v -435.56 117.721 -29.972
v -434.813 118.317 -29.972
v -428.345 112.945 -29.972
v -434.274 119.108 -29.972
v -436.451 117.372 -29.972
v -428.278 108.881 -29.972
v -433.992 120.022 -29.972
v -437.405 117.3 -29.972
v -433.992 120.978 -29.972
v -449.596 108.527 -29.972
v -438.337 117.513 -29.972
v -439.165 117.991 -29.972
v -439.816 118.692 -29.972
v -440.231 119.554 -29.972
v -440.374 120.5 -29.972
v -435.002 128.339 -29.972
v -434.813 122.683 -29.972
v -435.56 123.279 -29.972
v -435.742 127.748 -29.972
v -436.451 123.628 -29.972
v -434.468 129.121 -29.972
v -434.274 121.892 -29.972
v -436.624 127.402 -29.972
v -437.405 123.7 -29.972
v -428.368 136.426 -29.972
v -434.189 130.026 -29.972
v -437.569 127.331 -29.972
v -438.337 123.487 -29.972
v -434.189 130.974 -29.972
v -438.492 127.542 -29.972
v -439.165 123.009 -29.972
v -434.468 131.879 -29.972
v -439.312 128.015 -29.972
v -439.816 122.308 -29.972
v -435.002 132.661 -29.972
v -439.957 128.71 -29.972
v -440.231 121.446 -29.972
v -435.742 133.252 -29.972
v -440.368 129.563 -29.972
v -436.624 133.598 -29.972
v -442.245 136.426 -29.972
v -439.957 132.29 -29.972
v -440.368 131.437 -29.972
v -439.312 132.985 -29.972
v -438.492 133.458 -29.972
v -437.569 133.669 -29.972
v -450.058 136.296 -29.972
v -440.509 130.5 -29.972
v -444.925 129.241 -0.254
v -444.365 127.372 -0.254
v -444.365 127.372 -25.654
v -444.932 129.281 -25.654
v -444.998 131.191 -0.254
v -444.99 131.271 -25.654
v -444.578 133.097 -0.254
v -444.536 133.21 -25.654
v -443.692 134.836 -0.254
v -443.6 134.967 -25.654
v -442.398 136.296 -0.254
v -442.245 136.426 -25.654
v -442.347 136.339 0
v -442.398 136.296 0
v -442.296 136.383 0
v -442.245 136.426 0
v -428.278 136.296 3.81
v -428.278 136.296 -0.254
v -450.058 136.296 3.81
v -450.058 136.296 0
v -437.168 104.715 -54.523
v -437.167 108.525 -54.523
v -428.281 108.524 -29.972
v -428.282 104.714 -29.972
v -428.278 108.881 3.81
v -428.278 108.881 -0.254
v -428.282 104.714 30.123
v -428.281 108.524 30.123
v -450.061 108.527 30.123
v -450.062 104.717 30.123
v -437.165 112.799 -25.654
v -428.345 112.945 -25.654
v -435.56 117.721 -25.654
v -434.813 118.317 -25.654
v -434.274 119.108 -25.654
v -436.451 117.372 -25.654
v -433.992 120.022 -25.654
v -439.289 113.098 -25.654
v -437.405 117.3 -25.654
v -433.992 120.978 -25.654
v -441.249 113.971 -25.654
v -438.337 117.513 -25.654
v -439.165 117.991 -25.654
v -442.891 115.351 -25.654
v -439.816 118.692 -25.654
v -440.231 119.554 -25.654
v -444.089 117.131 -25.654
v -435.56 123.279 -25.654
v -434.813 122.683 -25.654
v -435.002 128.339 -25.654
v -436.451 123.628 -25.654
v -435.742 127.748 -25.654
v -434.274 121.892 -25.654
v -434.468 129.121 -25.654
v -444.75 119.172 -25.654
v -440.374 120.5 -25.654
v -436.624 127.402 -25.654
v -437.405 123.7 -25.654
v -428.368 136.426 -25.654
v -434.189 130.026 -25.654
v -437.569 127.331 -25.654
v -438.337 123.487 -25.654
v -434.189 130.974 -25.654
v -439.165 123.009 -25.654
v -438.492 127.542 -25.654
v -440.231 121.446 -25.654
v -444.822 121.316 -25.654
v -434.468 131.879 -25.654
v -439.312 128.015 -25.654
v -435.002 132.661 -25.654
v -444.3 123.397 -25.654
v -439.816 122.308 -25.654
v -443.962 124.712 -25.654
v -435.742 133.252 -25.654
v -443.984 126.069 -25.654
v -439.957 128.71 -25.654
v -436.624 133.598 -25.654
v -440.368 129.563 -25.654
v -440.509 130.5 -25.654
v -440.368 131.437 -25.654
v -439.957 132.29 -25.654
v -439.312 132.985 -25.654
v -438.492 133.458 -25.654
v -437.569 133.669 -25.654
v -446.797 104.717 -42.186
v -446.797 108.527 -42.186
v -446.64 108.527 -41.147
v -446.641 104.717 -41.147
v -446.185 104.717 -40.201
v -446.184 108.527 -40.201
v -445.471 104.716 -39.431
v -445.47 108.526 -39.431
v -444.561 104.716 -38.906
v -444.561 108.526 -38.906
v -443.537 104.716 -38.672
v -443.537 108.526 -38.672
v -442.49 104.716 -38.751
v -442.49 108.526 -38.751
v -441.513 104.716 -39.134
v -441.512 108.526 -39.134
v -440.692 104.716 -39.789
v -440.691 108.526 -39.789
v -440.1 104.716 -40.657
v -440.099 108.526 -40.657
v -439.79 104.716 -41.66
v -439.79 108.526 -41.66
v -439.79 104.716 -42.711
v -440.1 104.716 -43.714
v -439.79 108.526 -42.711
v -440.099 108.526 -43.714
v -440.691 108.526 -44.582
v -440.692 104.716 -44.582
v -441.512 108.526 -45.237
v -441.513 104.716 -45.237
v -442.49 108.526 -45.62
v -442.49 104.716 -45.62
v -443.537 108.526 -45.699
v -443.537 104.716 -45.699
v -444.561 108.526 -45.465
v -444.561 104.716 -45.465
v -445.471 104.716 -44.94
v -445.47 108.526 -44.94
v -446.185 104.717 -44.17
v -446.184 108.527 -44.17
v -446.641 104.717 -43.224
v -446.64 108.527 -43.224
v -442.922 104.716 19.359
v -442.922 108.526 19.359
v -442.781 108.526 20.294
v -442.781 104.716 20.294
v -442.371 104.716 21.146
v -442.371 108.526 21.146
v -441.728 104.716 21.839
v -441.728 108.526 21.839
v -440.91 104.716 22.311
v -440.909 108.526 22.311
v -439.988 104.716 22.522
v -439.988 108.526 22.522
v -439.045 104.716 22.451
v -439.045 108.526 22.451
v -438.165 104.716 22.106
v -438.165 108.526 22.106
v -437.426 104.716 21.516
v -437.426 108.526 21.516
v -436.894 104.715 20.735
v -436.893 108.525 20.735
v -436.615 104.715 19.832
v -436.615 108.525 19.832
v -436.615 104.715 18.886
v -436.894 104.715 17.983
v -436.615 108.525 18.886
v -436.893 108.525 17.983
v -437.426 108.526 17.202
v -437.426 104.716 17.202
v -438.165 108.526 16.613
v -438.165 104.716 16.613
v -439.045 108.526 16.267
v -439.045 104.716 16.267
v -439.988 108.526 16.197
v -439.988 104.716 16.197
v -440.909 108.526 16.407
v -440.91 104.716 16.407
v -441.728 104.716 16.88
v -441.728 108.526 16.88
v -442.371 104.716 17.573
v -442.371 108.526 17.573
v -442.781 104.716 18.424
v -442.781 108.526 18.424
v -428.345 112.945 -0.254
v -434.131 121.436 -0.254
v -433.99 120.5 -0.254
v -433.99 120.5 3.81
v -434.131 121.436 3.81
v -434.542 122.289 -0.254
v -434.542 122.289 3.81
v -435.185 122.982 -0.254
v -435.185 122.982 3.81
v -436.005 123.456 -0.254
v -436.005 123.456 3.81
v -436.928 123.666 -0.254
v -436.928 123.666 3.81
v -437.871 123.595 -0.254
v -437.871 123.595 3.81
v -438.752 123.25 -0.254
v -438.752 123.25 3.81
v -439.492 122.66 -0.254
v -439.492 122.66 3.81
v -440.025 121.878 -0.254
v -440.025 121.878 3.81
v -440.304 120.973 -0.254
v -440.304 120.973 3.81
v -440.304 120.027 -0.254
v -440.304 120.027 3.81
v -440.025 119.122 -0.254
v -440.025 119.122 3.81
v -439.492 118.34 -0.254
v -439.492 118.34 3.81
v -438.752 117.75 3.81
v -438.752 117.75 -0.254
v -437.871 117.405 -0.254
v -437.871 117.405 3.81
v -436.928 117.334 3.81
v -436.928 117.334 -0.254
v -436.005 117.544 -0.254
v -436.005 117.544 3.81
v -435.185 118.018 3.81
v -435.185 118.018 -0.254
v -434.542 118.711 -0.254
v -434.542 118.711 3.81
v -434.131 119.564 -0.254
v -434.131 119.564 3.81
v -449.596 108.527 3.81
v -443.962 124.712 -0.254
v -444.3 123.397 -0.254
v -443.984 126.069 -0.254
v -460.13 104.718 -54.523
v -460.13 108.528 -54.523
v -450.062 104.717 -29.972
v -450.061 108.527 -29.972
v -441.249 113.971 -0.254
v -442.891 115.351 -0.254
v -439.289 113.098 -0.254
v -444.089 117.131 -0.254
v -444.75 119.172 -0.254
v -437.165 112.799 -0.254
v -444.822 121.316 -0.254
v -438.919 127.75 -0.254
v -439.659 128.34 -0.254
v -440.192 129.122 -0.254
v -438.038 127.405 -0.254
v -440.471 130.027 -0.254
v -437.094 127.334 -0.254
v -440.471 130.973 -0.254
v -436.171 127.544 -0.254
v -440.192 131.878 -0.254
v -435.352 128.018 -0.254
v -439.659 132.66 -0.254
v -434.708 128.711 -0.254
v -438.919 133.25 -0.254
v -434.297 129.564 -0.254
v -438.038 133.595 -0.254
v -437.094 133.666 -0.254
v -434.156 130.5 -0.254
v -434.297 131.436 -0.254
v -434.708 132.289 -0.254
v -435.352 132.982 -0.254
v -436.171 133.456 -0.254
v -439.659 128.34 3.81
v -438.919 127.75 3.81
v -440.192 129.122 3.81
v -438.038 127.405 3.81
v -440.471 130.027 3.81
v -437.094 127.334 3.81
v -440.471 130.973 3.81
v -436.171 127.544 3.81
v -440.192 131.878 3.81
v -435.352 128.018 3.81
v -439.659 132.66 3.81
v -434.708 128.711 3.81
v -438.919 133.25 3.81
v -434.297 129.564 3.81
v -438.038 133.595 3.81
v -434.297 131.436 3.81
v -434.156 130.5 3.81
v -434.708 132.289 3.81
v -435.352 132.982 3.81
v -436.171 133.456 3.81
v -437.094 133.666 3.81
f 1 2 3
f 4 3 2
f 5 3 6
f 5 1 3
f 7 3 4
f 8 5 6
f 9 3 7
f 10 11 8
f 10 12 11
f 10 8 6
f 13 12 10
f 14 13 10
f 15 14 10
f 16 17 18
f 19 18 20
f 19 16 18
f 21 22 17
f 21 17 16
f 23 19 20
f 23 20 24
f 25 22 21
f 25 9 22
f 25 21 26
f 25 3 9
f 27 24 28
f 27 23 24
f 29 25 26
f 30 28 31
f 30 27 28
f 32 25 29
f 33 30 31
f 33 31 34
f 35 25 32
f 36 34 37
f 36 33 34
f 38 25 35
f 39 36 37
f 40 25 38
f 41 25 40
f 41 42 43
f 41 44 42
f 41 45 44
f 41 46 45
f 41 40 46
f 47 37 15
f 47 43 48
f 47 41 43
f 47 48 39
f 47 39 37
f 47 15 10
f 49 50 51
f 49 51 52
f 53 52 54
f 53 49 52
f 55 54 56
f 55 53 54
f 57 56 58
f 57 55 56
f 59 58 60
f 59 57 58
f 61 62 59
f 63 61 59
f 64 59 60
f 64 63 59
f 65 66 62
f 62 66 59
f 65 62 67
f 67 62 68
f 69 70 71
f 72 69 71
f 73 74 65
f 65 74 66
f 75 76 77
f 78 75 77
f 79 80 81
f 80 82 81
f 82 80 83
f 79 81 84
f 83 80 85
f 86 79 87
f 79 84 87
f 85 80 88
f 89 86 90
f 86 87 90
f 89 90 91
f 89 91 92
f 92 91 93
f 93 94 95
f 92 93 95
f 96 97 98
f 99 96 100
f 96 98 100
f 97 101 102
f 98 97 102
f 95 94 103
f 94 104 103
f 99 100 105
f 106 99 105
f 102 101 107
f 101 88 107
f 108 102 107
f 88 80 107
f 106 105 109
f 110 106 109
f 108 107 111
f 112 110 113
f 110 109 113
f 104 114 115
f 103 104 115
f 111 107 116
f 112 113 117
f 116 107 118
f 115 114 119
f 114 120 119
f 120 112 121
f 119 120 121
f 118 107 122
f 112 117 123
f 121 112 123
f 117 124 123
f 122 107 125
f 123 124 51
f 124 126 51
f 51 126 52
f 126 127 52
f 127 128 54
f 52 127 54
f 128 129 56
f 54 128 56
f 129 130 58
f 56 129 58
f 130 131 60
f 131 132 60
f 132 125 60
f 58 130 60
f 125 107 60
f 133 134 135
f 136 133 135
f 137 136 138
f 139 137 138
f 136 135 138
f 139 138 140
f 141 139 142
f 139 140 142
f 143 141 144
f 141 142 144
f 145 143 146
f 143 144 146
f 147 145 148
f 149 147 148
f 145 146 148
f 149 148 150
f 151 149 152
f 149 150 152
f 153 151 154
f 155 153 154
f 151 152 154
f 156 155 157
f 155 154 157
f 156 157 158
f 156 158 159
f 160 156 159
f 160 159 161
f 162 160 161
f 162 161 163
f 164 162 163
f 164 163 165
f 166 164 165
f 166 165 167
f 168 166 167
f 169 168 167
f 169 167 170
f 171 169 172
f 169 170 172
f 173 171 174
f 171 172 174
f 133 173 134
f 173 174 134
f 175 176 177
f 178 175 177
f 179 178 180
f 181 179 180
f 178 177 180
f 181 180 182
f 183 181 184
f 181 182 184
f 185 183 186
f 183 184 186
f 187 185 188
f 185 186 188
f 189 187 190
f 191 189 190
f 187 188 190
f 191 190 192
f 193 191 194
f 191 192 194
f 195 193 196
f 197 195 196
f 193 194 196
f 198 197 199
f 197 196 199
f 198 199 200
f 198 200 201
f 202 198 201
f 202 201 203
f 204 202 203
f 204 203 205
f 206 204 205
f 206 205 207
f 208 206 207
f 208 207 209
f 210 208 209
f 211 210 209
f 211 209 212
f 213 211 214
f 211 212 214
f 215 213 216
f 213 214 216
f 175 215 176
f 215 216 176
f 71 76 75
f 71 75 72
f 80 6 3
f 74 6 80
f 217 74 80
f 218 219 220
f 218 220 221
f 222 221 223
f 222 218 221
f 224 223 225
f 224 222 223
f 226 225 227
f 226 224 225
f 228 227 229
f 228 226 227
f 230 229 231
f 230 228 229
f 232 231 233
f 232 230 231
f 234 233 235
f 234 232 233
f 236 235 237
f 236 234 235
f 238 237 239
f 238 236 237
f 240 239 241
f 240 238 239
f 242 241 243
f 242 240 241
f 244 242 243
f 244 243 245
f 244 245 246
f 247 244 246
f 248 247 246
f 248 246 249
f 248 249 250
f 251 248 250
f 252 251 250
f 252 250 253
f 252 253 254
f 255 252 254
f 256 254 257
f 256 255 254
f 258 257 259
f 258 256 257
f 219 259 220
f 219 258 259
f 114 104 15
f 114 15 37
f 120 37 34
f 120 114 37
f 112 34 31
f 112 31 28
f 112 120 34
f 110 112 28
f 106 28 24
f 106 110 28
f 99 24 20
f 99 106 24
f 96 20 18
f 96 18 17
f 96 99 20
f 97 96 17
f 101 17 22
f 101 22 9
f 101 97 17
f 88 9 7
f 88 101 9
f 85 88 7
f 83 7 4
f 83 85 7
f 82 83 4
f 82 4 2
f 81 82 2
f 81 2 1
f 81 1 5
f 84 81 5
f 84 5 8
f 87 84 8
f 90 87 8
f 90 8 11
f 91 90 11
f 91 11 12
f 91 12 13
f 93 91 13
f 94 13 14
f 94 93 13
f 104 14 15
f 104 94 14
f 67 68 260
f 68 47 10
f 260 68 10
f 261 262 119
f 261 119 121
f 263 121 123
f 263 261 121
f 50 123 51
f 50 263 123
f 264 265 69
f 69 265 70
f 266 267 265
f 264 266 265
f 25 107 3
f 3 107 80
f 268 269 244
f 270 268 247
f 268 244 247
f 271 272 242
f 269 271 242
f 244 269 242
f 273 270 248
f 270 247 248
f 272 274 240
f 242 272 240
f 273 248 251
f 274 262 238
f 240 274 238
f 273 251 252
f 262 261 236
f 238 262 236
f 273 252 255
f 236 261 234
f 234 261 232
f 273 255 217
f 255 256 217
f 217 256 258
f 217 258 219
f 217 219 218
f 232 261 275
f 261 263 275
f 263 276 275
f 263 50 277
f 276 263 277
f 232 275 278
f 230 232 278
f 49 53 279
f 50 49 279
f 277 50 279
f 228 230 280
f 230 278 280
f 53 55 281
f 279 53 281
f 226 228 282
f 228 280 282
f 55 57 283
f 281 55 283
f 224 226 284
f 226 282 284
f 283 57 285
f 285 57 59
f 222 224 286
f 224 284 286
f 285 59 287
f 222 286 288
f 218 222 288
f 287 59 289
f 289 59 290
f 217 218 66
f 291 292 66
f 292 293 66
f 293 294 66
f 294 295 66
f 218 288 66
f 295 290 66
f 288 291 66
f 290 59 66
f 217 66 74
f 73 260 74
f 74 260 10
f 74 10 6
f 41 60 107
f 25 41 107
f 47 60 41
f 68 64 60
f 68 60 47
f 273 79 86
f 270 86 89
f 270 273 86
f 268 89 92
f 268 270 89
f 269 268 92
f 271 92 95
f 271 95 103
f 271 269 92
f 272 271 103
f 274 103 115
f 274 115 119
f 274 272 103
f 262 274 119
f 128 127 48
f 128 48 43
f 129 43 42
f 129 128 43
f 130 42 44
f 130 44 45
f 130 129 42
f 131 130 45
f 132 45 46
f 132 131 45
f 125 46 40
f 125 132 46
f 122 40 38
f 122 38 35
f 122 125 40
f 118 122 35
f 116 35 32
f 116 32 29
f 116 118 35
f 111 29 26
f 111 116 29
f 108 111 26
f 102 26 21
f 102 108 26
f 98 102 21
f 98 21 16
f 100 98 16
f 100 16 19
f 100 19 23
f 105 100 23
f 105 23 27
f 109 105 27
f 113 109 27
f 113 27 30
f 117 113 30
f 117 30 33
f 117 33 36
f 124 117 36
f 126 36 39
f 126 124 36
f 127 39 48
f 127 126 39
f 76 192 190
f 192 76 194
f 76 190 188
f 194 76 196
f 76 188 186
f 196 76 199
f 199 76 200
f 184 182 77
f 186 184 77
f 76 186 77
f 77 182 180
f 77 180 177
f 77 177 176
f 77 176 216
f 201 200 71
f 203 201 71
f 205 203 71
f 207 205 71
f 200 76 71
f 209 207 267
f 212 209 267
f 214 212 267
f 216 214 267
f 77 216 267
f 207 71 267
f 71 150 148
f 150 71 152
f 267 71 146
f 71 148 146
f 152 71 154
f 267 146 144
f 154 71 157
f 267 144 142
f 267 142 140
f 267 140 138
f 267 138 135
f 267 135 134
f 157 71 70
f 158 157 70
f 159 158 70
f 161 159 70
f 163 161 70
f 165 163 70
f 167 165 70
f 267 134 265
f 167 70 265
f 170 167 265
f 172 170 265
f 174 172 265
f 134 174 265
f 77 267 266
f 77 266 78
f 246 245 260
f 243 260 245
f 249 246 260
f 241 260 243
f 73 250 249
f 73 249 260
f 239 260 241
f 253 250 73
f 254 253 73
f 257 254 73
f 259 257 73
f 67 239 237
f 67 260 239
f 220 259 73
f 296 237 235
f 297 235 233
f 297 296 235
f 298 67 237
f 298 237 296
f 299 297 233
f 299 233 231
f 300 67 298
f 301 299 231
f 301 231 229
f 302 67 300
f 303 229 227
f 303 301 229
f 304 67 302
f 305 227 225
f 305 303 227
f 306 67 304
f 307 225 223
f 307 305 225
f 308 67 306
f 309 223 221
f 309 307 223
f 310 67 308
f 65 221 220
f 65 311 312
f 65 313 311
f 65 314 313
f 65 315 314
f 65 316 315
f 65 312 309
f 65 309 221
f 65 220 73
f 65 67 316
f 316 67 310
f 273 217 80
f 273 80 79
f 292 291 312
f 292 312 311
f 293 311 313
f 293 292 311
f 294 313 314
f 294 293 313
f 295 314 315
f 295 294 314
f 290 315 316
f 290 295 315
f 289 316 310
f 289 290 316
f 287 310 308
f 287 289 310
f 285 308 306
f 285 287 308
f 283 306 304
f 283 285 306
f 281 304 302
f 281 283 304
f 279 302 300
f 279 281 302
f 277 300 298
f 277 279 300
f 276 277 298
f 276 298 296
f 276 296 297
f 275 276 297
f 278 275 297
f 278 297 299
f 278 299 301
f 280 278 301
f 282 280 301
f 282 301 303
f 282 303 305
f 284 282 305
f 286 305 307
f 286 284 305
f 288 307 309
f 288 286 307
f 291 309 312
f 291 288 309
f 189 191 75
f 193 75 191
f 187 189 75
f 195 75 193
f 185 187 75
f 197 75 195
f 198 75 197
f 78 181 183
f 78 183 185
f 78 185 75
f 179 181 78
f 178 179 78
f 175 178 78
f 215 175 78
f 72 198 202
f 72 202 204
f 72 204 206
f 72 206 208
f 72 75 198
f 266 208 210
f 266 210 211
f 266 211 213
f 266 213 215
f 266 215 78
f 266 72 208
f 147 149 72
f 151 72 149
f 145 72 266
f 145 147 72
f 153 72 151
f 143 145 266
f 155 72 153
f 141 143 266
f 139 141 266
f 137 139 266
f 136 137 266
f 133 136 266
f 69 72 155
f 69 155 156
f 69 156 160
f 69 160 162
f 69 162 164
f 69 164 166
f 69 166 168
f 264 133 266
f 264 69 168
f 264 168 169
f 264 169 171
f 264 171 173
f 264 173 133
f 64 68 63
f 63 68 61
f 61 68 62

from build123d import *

# Parameters (mm, degrees)
BOSS_EXTRUDE1_DEPTH      = 29.972
BOSS_EXTRUDE2_DEPTH      = 3.81
BOSS_EXTRUDE2_DEPTH_BACK = 0.254
SKETCH4_R                = 3.175
BOSS_EXTRUDE3_START      = -4.318
SKETCH6_R                = 3.177814596
SKETCH6_R_2              = 3.208783605
BOSS_EXTRUDE3_DEPTH      = 4.318
SKETCH7_R                = 3.171284257
SKETCH7_R_2              = 3.52301874
BOSS_EXTRUDE4_DEPTH      = 3.81


with BuildPart() as part:
    # Sketch1 → Boss-Extrude1 (new body)
    with BuildSketch(Plane.XY):
        with BuildLine():
            Line((-428.277811685, 108.881459693), (-428.34538043, 112.94489795))
            Line((-428.34538043, 112.94489795), (-437.164813366, 112.799308879))
            ThreePointArc((-437.164813366, 112.799308879), (-443.55265803, 116.199292583), (-444.299822548, 123.396944549))
            ThreePointArc((-444.299822548, 123.396944549), (-443.927333751, 125.391172793), (-444.36491239, 127.372136984))
            ThreePointArc((-444.36491239, 127.372136984), (-444.826279861, 132.255084277), (-442.244950431, 136.42554859))
            Line((-442.244950431, 136.42554859), (-450.05783618, 136.295632285))
            Line((-450.05783618, 136.295632285), (-449.596085914, 108.526969495))
            Line((-449.596085914, 108.526969495), (-428.277811685, 108.881459693))
        make_face()
    extrude(amount=-BOSS_EXTRUDE1_DEPTH)

    # Sketch4 → Boss-Extrude2 (add, two sides: drawn at the far end of the back side and taken through both)
    with BuildSketch(Plane.XY.offset(-BOSS_EXTRUDE2_DEPTH_BACK)):
        Polygon((-450.05783618, 136.295632285), (-449.596085914, 108.526969495), (-428.277811685, 108.881459693), (-428.277811685, 136.295632285), align=None)
        with Locations((-437.164813366, 120.5)):
            Circle(SKETCH4_R, mode=Mode.SUBTRACT)
        with Locations((-437.331098026, 130.5)):
            Circle(SKETCH4_R, mode=Mode.SUBTRACT)
    extrude(amount=BOSS_EXTRUDE2_DEPTH + BOSS_EXTRUDE2_DEPTH_BACK)

    # Sketch6 → Boss-Extrude3 (add)
    with BuildSketch(Plane(origin=(0, 0, -29.972), x_dir=(-1, 0, 0), z_dir=(0, 0, -1)).offset(BOSS_EXTRUDE3_START)):
        with BuildLine():
            Line((442.244950431, 136.42554859), (428.367659487, 136.42554859))
            Line((428.367659487, 136.42554859), (428.34538043, 112.94489795))
            Line((428.34538043, 112.94489795), (437.164813366, 112.799308879))
            ThreePointArc((437.164813366, 112.799308879), (443.55265803, 116.199292583), (444.299822548, 123.396944549))
            ThreePointArc((444.299822548, 123.396944549), (443.927333751, 125.391172793), (444.36491239, 127.372136984))
            ThreePointArc((444.36491239, 127.372136984), (444.826279861, 132.255084277), (442.244950431, 136.42554859))
        make_face()
        with Locations((437.331098026, 130.5)):
            Circle(SKETCH6_R, mode=Mode.SUBTRACT)
        with Locations((437.164813366, 120.5)):
            Circle(SKETCH6_R_2, mode=Mode.SUBTRACT)
    extrude(amount=BOSS_EXTRUDE3_DEPTH)


with BuildPart() as body_2:
    # Sketch7 → Boss-Extrude4 (new body)
    with BuildSketch(Plane(origin=(0.013089851, 108.472713295, 0), x_dir=(0.9999999927188763, -0.00012067413737196964, 0), z_dir=(0.00012067413737196965, 0.9999999927188764, 3.026052666249046e-15))):
        Polygon((-428.294255925, 29.972), (-428.294255925, -3.81), (-428.294255925, -30.122888974), (-450.074280261, -30.122888974), (-450.074280261, -3.81), (-450.074280261, 29.972), (-460.142837278, 54.522803602), (-437.18058237, 54.522803602), align=None)
        with Locations(Location((-439.763703675, -19.359151609, 0), (0, 0, 180))):
            Circle(SKETCH7_R, mode=Mode.SUBTRACT)
        with Locations(Location((-443.286722414, 42.185510265, 0), (0, 0, 180))):
            Circle(SKETCH7_R_2, mode=Mode.SUBTRACT)
    extrude(amount=-BOSS_EXTRUDE4_DEPTH)


solid = Compound([part.part, body_2.part])
